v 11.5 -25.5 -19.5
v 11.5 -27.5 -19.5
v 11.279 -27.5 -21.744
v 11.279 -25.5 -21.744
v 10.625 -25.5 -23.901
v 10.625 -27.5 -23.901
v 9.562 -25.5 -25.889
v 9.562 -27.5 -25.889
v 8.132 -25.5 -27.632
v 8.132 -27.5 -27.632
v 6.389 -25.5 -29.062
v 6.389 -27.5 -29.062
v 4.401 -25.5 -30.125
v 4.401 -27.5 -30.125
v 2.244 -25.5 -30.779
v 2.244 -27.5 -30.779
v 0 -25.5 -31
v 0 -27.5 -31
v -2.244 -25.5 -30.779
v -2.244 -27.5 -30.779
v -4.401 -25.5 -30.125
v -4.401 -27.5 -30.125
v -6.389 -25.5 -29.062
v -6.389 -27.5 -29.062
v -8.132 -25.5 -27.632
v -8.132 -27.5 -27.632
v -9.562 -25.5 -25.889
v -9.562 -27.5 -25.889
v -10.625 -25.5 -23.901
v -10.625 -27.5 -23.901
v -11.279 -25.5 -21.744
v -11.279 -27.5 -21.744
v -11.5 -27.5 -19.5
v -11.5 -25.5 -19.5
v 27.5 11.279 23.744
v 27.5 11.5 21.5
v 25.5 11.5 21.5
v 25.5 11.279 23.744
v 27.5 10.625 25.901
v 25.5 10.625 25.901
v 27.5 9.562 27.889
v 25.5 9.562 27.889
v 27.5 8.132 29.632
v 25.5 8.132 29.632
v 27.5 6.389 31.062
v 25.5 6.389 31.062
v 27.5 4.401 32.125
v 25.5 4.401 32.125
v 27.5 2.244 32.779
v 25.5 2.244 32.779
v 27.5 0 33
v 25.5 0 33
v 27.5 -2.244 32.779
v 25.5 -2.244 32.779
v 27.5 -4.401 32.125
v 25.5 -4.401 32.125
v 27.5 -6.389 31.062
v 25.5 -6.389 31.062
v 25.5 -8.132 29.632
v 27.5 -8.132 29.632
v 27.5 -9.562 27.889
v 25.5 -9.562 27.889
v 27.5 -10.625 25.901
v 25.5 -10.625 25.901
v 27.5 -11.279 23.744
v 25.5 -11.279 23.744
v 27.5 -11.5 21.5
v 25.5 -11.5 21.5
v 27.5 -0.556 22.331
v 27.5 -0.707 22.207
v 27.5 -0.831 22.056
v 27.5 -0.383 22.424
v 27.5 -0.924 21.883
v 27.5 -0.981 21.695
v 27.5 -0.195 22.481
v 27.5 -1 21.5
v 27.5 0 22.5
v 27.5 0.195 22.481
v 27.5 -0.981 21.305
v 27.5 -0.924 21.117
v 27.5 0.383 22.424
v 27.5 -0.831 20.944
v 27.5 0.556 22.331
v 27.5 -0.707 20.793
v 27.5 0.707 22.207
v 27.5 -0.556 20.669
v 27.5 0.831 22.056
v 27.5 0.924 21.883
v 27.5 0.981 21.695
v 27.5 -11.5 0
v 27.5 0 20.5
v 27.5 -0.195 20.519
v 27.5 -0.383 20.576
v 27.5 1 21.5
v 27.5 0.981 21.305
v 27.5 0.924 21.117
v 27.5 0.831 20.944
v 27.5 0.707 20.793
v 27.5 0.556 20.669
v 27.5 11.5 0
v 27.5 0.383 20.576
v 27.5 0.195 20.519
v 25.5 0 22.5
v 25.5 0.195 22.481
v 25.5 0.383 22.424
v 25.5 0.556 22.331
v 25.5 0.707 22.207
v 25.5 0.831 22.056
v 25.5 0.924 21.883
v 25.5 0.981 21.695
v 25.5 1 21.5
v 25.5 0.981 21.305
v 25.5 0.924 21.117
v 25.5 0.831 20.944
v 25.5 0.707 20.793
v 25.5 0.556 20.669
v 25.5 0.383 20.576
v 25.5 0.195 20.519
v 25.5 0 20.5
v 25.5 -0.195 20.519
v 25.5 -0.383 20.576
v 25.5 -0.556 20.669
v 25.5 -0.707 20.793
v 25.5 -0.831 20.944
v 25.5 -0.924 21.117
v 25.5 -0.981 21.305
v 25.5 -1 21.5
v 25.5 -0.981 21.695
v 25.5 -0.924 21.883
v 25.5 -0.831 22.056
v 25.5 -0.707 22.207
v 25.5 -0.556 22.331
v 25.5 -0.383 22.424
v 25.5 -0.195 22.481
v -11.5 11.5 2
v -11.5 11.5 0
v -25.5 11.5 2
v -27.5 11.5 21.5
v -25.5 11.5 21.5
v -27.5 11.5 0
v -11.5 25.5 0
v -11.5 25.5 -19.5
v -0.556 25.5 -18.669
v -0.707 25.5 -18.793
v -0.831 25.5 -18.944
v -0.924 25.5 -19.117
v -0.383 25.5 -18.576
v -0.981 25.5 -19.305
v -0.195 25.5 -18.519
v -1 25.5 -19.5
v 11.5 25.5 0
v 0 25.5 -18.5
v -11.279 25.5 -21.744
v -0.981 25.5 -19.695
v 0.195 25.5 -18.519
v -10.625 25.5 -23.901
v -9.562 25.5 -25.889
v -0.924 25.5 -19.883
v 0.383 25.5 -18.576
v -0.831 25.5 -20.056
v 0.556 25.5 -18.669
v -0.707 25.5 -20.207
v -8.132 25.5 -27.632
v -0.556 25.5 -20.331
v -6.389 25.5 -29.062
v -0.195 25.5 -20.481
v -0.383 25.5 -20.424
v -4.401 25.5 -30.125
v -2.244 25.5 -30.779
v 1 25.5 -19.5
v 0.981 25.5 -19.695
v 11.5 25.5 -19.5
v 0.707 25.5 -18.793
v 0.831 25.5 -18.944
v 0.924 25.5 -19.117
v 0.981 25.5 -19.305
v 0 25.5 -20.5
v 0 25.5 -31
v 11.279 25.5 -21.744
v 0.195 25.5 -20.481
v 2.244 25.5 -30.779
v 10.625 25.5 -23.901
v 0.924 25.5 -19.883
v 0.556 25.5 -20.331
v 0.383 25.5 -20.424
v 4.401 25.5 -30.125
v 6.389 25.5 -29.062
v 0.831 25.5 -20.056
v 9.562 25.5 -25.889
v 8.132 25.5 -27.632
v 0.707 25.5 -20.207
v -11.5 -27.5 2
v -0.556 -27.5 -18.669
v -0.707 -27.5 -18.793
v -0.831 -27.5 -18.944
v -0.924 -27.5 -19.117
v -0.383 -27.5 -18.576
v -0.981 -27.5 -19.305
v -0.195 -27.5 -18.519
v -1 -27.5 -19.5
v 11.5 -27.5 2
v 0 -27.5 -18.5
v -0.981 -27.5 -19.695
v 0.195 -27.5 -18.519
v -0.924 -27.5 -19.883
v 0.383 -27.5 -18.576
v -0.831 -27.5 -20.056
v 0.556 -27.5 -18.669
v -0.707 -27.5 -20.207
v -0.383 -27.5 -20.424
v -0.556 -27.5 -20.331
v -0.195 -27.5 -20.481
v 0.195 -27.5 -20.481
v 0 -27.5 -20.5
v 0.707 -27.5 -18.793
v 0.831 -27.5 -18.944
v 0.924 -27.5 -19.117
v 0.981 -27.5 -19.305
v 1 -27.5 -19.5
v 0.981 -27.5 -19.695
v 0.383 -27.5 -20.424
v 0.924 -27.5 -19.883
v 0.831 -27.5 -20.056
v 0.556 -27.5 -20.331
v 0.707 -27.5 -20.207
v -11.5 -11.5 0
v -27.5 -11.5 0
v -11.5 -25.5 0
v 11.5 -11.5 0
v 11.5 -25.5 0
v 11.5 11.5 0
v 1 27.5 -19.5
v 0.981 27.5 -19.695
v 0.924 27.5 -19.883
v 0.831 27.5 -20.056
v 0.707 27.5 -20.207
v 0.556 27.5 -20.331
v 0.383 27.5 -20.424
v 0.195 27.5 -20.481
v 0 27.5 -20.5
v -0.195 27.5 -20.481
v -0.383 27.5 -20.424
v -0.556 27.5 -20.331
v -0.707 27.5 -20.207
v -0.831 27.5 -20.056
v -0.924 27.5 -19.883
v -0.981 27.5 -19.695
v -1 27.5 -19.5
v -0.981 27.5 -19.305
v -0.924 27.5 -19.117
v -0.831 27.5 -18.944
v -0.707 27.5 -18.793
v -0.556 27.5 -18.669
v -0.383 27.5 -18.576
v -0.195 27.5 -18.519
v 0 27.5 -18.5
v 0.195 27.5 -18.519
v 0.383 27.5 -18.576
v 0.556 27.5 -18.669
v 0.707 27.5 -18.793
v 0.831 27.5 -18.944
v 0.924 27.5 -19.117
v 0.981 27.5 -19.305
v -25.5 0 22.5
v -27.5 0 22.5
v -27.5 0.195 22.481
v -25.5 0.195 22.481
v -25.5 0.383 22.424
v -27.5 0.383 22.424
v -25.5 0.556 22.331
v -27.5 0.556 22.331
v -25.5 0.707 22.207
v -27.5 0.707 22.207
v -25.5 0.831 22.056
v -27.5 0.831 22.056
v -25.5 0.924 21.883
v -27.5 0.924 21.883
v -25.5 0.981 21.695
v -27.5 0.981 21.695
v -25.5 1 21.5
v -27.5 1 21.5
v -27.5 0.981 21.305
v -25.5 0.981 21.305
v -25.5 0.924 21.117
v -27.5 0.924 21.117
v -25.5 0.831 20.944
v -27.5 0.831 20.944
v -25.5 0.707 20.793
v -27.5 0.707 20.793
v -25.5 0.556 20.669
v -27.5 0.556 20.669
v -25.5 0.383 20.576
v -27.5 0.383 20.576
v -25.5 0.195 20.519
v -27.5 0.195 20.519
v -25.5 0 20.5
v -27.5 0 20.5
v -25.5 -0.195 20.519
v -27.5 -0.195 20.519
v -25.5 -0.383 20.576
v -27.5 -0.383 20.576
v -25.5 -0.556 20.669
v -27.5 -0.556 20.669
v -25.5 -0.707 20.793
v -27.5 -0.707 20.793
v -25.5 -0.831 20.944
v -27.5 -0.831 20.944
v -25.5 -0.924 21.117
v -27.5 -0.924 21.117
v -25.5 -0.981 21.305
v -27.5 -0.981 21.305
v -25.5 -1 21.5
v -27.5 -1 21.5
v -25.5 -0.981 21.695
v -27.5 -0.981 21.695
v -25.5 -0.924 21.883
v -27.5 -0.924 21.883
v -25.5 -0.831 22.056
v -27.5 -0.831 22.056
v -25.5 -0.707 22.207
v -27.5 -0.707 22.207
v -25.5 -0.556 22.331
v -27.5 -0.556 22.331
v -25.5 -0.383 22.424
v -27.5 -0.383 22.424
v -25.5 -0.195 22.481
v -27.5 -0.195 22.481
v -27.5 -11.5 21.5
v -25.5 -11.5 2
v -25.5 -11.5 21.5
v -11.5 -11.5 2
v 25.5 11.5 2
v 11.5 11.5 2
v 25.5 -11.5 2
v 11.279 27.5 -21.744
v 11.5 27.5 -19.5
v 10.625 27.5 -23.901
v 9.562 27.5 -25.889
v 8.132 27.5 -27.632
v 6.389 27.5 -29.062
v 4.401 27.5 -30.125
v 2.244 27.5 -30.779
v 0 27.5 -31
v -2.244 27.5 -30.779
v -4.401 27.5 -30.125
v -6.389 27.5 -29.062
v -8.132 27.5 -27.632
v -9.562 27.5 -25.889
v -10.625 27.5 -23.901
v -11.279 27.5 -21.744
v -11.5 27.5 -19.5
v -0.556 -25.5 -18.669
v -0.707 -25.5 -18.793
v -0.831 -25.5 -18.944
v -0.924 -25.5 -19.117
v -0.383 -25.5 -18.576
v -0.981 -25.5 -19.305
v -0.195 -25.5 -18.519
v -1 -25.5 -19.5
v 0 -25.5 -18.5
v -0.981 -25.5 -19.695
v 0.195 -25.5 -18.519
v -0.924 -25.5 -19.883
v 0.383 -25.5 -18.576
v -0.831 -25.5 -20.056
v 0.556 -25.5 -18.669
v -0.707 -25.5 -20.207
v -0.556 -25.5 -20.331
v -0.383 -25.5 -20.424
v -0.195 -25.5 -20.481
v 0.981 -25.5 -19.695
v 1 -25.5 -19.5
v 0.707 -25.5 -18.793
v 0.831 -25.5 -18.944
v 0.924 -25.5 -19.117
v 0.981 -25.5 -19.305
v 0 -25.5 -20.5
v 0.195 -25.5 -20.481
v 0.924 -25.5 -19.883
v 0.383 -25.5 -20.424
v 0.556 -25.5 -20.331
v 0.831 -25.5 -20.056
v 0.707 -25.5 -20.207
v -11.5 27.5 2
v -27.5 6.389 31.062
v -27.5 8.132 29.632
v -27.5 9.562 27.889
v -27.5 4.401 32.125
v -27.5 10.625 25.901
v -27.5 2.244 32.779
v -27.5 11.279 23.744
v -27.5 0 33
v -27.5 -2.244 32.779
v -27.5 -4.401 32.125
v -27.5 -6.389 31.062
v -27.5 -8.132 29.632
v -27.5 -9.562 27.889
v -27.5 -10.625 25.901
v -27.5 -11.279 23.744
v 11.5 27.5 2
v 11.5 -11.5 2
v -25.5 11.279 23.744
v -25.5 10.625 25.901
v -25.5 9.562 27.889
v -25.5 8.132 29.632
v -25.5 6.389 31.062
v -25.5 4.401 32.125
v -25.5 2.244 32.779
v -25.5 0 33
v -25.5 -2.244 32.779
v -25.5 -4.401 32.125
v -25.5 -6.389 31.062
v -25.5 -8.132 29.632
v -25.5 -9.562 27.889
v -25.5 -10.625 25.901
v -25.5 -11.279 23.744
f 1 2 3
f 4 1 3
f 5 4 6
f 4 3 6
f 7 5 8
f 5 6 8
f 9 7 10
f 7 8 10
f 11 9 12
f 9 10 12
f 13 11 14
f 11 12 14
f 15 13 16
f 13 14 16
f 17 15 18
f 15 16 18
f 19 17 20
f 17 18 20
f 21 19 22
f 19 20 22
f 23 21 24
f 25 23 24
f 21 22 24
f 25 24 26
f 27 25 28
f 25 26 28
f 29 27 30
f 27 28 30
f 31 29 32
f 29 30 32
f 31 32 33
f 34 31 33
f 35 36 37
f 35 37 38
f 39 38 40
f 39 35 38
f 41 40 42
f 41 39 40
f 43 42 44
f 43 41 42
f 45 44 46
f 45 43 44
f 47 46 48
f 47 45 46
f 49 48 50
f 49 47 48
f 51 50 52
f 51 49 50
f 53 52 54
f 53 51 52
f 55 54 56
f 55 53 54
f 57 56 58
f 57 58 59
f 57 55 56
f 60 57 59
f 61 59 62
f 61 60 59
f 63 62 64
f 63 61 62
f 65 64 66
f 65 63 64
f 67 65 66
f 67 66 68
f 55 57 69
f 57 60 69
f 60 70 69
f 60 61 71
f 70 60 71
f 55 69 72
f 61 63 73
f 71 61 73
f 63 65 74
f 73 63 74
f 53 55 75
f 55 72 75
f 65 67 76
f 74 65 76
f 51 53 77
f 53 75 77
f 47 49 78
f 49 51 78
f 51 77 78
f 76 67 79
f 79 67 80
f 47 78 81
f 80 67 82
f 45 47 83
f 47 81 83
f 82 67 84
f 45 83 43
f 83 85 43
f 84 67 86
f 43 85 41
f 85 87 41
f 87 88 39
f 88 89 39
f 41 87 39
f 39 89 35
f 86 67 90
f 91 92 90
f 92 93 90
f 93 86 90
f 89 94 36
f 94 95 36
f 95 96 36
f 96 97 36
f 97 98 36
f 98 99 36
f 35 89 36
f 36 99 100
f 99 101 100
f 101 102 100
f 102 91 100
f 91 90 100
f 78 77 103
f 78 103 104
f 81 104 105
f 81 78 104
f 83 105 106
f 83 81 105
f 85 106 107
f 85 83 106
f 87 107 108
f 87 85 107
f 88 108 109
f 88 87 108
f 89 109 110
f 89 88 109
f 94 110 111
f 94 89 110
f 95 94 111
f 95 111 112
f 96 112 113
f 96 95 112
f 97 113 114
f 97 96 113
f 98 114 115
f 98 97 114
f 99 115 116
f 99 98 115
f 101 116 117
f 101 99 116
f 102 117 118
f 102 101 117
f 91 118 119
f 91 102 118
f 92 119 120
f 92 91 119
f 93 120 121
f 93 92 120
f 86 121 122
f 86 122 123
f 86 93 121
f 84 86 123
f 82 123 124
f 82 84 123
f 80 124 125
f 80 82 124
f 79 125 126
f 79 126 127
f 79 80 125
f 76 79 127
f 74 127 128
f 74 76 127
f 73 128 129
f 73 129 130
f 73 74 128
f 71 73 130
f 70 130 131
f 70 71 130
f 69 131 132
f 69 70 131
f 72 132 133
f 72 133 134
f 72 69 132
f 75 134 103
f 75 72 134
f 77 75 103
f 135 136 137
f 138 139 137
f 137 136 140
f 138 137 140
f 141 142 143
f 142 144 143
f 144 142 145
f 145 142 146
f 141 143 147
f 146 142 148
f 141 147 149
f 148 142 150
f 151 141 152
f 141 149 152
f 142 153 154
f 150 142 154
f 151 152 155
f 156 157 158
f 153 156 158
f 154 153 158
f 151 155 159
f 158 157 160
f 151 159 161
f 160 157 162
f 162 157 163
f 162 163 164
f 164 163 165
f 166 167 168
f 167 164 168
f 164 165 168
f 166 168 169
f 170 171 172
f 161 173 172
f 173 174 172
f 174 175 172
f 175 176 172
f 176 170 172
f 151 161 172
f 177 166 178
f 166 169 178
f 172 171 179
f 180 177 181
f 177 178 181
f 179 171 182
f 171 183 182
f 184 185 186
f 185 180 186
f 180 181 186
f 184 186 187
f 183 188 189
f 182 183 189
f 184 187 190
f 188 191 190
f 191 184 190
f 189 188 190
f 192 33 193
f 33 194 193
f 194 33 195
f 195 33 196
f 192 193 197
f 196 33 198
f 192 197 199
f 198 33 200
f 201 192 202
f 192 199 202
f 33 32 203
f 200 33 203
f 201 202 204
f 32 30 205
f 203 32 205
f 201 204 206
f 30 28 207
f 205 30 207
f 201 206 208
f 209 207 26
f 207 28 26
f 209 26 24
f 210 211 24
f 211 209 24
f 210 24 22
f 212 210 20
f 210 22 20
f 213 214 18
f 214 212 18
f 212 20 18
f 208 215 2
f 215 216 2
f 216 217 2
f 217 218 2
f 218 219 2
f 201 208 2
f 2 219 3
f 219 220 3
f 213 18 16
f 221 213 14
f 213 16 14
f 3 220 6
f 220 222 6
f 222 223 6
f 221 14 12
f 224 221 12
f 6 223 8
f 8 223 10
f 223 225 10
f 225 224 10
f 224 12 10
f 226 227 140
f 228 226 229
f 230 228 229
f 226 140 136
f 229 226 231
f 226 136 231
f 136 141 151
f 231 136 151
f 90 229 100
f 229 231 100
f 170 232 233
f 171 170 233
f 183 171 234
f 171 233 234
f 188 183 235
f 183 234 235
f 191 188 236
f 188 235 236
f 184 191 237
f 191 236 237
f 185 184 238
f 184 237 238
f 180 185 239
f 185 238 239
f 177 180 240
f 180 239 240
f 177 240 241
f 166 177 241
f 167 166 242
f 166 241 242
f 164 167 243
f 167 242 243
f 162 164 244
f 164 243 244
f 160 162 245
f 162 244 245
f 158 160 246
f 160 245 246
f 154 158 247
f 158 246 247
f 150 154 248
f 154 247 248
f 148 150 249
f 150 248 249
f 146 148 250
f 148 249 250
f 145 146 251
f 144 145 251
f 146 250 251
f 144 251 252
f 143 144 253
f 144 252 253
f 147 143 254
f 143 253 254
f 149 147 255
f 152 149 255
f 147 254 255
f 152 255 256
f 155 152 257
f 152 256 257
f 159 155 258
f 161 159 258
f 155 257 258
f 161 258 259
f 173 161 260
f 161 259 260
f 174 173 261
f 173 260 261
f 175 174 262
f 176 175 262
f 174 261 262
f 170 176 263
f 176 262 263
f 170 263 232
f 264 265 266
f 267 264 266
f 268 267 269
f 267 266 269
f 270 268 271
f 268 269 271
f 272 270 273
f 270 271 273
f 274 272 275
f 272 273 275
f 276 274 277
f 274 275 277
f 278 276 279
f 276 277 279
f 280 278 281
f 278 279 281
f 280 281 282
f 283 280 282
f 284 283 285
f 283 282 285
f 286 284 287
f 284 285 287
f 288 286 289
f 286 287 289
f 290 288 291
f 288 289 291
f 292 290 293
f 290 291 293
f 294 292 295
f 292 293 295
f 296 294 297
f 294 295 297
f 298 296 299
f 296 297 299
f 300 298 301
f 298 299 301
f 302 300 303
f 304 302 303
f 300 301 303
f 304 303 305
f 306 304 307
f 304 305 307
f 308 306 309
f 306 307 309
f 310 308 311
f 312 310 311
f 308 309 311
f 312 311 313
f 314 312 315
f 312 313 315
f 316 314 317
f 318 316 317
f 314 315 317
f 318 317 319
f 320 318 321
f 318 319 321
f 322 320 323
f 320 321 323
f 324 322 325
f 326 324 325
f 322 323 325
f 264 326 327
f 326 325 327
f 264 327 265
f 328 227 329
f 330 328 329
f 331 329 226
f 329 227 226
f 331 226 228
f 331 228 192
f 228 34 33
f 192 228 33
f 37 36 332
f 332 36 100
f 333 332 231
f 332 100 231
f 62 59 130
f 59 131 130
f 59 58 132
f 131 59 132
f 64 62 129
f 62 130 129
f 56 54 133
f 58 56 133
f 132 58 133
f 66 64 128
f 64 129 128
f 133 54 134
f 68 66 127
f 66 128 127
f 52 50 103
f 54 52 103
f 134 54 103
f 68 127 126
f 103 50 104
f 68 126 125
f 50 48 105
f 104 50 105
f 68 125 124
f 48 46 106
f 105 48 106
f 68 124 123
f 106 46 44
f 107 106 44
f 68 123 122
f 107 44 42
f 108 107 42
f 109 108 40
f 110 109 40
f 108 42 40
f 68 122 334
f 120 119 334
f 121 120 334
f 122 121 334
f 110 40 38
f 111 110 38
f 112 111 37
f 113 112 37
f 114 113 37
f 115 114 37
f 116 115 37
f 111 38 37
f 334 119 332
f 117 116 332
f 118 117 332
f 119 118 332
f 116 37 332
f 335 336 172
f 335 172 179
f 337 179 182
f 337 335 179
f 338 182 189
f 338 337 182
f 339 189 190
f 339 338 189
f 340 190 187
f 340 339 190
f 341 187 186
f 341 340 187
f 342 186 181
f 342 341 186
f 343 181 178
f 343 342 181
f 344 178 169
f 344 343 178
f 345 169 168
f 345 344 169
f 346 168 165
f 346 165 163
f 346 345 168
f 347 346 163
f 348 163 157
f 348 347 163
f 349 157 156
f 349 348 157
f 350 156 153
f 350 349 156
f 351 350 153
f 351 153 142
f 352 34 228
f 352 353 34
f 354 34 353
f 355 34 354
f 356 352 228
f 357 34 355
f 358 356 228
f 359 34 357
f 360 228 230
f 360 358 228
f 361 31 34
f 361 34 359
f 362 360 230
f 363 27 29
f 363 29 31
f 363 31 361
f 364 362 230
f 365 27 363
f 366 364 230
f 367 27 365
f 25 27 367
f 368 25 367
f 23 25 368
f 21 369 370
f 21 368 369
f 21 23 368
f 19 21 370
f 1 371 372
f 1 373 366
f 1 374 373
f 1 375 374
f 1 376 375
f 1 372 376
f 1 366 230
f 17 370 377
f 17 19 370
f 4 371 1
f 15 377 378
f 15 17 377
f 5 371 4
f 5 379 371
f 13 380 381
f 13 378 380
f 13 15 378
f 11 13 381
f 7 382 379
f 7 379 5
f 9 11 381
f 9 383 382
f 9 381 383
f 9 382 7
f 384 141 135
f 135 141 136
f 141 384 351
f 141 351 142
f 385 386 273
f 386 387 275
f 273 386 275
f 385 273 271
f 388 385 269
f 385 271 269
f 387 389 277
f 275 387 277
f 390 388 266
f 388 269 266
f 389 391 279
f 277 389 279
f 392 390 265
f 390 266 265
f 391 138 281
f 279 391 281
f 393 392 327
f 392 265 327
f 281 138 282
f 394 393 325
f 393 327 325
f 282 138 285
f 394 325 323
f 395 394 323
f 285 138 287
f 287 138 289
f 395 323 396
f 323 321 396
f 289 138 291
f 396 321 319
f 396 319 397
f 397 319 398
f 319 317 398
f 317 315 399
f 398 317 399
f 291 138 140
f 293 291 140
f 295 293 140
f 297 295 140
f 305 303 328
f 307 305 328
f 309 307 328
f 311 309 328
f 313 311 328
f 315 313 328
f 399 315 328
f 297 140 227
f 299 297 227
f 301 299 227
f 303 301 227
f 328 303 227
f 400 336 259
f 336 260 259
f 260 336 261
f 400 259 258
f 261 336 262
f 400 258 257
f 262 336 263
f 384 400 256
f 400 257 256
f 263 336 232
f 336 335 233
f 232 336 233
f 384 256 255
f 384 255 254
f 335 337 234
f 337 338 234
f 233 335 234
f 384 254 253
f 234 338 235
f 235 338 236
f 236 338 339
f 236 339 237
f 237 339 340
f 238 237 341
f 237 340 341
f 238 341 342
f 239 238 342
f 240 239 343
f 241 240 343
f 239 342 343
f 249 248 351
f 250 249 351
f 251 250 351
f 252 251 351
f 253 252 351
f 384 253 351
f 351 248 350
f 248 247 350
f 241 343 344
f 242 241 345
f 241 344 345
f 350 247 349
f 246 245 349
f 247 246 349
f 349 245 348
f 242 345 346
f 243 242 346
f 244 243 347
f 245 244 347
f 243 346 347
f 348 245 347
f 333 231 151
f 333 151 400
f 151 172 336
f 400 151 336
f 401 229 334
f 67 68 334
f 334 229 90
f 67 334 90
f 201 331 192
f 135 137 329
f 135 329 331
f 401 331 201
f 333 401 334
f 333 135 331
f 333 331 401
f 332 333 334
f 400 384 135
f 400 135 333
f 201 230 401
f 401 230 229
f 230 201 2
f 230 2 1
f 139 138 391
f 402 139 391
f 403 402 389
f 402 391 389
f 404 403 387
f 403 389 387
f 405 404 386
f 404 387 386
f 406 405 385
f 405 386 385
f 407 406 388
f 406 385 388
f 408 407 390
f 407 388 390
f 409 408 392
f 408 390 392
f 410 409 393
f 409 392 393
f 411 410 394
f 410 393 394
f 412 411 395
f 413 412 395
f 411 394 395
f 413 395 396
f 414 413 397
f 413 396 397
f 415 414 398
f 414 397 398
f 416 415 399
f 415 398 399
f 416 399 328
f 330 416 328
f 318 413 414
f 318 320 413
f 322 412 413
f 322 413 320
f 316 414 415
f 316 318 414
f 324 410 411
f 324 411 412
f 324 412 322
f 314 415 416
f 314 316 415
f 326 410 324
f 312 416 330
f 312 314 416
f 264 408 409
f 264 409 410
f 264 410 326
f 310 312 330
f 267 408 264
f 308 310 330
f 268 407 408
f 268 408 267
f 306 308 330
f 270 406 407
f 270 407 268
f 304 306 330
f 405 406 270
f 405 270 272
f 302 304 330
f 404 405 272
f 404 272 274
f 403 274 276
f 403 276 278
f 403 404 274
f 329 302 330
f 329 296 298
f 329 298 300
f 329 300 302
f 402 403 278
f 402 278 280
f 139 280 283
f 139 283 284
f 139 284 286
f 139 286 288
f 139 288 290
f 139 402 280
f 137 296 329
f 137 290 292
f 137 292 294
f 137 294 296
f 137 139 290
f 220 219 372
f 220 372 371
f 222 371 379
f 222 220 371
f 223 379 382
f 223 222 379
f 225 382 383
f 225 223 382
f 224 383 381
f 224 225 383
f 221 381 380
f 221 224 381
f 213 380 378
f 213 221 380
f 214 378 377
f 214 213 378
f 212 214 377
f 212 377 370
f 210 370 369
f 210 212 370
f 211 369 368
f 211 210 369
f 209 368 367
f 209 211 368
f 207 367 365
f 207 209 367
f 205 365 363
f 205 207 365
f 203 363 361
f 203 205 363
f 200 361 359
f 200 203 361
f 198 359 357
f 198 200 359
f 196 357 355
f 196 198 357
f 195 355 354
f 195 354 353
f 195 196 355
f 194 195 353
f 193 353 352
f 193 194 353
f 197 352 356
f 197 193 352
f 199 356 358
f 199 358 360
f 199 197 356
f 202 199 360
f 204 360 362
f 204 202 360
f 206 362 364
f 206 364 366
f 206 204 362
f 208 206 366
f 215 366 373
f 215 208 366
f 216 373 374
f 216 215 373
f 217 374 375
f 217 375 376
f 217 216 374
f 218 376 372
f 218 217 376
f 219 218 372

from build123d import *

# Parameters (mm, degrees)
EXTRUDE_1_DEPTH     = 2
EXTRUDE_2_DEPTH     = 2
SKETCH_4_R          = 1
CUT_EXTRUDE_1_DEPTH = 2
EXTRUDE_4_DEPTH     = 2
SKETCH_8_R          = 1
CUT_EXTRUDE_3_DEPTH = 2


with BuildPart() as part:
    # 草图1 → 凸台-拉伸1 (new body)
    with BuildSketch(Plane.XY):
        Polygon((27.5, -11.5), (27.5, 11.5), (11.5, 11.5), (11.5, 27.5), (-11.5, 27.5), (-11.5, 11.5), (-27.5, 11.5), (-27.5, -11.5), (-11.5, -11.5), (-11.5, -27.5), (11.5, -27.5), (11.5, -11.5), align=None)
    extrude(amount=EXTRUDE_1_DEPTH)

    # 草图3 → 凸台-拉伸2 (add)
    with BuildSketch(Plane(origin=(0, 27.5, 0), x_dir=(1, 0, 0), z_dir=(0, 1, 0))):
        with BuildLine():
            Line((-11.5, -2), (11.5, -2))
            Line((11.5, -2), (11.5, 19.5))
            ThreePointArc((11.5, 19.5), (0, 31), (-11.5, 19.5))
            Line((-11.5, 19.5), (-11.5, -2))
        make_face()
    extrude_2 = extrude(amount=-EXTRUDE_2_DEPTH)

    # 草图4 → 切除-拉伸1 (cut)
    with BuildSketch(Plane(origin=(0, 27.5, 0), x_dir=(1, 0, 0), z_dir=(0, 1, 0))):
        with Locations((0, 19.5)):
            Circle(SKETCH_4_R)
    cut_extrude_1 = extrude(amount=-CUT_EXTRUDE_1_DEPTH, mode=Mode.SUBTRACT)

    # 镜向2: 凸台-拉伸2, 切除-拉伸1 across plane
    add(extrude_2.mirror(Plane.ZX))
    add(cut_extrude_1.mirror(Plane.ZX), mode=Mode.SUBTRACT)

    # 草图7 → 凸台-拉伸4 (add)
    with BuildSketch(Plane.ZY.offset(27.5)):
        with BuildLine():
            Line((0, 11.5), (21.5, 11.5))
            ThreePointArc((21.5, 11.5), (33, 0), (21.5, -11.5))
            Line((21.5, -11.5), (0, -11.5))
            Line((0, -11.5), (0, 11.5))
        make_face()
    extrude_4 = extrude(amount=-EXTRUDE_4_DEPTH)

    # 草图8 → 切除-拉伸3 (cut)
    with BuildSketch(Plane.ZY.offset(27.5)):
        with Locations((21.5, 0)):
            Circle(SKETCH_8_R)
    cut_extrude_3 = extrude(amount=-CUT_EXTRUDE_3_DEPTH, mode=Mode.SUBTRACT)

    # 镜向4: 凸台-拉伸4, 切除-拉伸3 across plane
    add(extrude_4.mirror(Plane(origin=(0, 0, 0), x_dir=(0, 0, 1), z_dir=(1, 0, 0))))
    add(cut_extrude_3.mirror(Plane(origin=(0, 0, 0), x_dir=(0, 0, 1), z_dir=(1, 0, 0))), mode=Mode.SUBTRACT)


solid = part.part
